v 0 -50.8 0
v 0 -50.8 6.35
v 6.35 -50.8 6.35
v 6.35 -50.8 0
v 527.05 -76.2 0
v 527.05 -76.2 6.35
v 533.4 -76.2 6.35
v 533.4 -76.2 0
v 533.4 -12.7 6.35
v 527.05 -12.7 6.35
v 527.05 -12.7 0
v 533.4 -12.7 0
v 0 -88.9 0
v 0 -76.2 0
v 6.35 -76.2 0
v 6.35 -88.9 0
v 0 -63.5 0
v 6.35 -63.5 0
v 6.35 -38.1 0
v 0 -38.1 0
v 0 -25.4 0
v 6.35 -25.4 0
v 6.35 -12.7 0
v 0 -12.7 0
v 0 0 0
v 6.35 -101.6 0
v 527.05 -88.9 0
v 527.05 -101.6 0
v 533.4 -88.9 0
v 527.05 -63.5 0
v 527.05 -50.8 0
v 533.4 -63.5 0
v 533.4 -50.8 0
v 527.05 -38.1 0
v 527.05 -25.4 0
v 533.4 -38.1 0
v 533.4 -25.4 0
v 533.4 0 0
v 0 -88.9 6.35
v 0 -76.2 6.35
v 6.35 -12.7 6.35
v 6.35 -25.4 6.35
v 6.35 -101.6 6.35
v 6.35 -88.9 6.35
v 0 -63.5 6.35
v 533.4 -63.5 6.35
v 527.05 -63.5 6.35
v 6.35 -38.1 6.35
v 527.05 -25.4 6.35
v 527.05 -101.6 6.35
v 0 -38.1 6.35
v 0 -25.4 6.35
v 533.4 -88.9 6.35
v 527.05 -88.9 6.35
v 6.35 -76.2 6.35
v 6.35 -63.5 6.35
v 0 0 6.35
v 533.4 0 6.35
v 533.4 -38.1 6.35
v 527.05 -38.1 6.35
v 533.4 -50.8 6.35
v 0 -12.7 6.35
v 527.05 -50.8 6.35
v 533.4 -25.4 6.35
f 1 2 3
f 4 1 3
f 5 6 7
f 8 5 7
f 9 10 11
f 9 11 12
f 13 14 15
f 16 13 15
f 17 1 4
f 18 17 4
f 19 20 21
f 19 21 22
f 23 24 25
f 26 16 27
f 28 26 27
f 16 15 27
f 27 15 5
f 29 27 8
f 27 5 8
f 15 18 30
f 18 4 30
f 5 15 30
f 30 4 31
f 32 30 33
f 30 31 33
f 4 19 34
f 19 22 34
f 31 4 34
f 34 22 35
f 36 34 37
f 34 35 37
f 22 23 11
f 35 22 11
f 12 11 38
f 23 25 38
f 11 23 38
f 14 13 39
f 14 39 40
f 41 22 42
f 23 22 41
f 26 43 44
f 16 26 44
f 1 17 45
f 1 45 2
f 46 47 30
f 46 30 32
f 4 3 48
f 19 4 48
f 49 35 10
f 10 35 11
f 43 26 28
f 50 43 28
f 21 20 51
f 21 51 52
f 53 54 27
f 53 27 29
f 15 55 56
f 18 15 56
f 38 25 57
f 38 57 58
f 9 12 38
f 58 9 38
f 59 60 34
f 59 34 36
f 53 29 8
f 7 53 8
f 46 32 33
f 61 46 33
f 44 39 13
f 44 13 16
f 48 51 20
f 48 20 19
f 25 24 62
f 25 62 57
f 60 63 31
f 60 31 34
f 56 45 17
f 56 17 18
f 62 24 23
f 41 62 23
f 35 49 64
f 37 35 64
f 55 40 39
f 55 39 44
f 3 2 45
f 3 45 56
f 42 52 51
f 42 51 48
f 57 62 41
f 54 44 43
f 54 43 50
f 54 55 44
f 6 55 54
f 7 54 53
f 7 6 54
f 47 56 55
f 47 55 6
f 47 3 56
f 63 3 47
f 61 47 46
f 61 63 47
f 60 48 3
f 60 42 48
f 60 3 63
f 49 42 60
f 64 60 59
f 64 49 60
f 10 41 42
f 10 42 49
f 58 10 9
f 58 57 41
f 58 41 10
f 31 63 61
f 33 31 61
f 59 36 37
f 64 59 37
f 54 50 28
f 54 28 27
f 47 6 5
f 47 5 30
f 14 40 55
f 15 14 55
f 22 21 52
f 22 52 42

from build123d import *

# Parameters (mm, degrees)
SKETCH_W               = 533.4
SKETCH_H               = 101.6
PAD_DEPTH              = 6.35
SKETCH010_W            = 6.35
SKETCH010_H            = 12.7
POCKET004_DEPTH        = 0.001
POCKET004_DEPTH_BACK   = 6.351
LINEARPATTERN005_COUNT = 6
LINEARPATTERN005_PITCH = 25.4


with BuildPart() as part:
    # Sketch → Pad (new body)
    with BuildSketch(Plane.XY):
        with Locations((266.7, -50.8)):
            Rectangle(SKETCH_W, SKETCH_H)
    extrude(amount=PAD_DEPTH)

    # Sketch010 → Pocket004 (cut, two sides)
    with BuildSketch(Plane.XY) as pocket004_sk:
        with Locations((3.175, -19.05)):
            Rectangle(SKETCH010_W, SKETCH010_H)
        with Locations((530.225, -19.05)):
            Rectangle(SKETCH010_W, SKETCH010_H)
    pocket004 = extrude(amount=-POCKET004_DEPTH, mode=Mode.SUBTRACT) + extrude(pocket004_sk.sketch, amount=POCKET004_DEPTH_BACK, mode=Mode.SUBTRACT)

    # LinearPattern005: Pocket004 ×6
    with Locations(*[(0, -i * LINEARPATTERN005_PITCH, 0) for i in range(1, LINEARPATTERN005_COUNT)]):
        add(pocket004, mode=Mode.SUBTRACT)


solid = part.part
